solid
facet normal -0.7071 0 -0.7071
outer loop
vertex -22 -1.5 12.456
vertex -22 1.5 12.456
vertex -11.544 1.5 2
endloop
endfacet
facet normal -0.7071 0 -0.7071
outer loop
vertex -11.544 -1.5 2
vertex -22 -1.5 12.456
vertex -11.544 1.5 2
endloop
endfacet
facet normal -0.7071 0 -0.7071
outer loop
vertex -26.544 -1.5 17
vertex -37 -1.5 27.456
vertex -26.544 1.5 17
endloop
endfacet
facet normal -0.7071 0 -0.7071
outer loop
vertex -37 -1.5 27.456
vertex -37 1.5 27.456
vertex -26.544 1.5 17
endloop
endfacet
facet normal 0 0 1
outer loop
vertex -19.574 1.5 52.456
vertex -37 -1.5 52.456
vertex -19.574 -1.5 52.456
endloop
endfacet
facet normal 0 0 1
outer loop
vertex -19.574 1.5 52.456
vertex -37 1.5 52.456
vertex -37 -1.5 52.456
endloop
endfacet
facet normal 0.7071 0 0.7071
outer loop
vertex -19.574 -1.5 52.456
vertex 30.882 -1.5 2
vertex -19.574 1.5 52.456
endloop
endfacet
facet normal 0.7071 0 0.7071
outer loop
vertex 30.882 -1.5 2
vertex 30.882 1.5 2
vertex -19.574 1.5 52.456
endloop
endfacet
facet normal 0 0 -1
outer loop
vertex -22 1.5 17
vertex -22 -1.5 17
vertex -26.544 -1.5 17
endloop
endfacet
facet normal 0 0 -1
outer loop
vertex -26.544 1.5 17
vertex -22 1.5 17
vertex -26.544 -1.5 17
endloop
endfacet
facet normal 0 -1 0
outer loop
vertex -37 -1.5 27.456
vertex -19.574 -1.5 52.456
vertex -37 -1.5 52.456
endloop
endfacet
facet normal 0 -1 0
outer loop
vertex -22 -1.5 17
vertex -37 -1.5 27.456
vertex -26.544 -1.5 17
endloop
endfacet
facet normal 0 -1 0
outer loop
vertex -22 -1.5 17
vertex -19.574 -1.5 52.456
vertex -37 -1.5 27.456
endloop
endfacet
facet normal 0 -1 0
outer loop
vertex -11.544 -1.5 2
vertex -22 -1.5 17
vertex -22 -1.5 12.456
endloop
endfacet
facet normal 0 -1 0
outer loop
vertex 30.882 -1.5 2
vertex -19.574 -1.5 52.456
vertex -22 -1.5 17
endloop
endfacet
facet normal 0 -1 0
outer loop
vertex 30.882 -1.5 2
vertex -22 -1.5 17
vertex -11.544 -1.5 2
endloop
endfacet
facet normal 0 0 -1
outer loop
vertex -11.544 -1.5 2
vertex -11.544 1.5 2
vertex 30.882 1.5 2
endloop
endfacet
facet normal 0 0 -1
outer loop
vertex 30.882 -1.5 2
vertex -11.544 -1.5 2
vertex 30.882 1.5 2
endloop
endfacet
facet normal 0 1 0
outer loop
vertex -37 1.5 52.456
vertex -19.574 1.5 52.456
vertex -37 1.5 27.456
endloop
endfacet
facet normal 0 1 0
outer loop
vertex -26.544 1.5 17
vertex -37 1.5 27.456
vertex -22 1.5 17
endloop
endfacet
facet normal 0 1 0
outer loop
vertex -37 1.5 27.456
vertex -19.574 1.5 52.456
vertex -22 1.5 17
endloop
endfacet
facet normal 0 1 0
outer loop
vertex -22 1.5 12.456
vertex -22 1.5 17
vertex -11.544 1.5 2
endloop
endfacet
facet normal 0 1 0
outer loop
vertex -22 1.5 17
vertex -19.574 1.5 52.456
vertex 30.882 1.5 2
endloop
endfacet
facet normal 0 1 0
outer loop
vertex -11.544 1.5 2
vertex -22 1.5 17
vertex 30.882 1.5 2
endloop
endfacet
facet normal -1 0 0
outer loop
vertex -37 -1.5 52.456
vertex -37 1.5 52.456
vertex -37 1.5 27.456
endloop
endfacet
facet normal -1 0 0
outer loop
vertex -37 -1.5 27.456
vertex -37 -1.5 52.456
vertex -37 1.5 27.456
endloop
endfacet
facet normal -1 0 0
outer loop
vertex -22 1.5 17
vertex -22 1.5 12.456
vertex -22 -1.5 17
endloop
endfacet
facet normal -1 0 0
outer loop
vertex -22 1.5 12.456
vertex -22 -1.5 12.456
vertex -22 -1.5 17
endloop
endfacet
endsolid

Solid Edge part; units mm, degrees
sketch "Sketch1" plane through (0, 0, 0) normal (0, -1, 0) x (1, 0, 0)
  line L0 (30.8823, 2) -> (-19.5736, 52.4558)
  line L1 (-37, 52.4558) -> (-19.5736, 52.4558)
  line L2 (-37, 52.4558) -> (-37, 27.4558)
  line L3 (-37, 27.4558) -> (-11.5442, 2)
  line L4 (-11.5442, 2) -> (30.8823, 2)
extrude "Protrusion1" add sketch "Sketch1" along normal mid plane 3
sketch "Sketch2" plane through (0, 0, 0) normal (0, -1, 0) x (1, 0, 0)
  line L0 (-22, 17) -> (-37, 17)
  line L1 (-37, 17) -> (-37, 2)
  line L2 (-37, 2) -> (-22, 2)
  line L3 (-22, 2) -> (-22, 17)
extrude "Cutout1" cut sketch "Sketch2" against normal up to next and the other way up to next
